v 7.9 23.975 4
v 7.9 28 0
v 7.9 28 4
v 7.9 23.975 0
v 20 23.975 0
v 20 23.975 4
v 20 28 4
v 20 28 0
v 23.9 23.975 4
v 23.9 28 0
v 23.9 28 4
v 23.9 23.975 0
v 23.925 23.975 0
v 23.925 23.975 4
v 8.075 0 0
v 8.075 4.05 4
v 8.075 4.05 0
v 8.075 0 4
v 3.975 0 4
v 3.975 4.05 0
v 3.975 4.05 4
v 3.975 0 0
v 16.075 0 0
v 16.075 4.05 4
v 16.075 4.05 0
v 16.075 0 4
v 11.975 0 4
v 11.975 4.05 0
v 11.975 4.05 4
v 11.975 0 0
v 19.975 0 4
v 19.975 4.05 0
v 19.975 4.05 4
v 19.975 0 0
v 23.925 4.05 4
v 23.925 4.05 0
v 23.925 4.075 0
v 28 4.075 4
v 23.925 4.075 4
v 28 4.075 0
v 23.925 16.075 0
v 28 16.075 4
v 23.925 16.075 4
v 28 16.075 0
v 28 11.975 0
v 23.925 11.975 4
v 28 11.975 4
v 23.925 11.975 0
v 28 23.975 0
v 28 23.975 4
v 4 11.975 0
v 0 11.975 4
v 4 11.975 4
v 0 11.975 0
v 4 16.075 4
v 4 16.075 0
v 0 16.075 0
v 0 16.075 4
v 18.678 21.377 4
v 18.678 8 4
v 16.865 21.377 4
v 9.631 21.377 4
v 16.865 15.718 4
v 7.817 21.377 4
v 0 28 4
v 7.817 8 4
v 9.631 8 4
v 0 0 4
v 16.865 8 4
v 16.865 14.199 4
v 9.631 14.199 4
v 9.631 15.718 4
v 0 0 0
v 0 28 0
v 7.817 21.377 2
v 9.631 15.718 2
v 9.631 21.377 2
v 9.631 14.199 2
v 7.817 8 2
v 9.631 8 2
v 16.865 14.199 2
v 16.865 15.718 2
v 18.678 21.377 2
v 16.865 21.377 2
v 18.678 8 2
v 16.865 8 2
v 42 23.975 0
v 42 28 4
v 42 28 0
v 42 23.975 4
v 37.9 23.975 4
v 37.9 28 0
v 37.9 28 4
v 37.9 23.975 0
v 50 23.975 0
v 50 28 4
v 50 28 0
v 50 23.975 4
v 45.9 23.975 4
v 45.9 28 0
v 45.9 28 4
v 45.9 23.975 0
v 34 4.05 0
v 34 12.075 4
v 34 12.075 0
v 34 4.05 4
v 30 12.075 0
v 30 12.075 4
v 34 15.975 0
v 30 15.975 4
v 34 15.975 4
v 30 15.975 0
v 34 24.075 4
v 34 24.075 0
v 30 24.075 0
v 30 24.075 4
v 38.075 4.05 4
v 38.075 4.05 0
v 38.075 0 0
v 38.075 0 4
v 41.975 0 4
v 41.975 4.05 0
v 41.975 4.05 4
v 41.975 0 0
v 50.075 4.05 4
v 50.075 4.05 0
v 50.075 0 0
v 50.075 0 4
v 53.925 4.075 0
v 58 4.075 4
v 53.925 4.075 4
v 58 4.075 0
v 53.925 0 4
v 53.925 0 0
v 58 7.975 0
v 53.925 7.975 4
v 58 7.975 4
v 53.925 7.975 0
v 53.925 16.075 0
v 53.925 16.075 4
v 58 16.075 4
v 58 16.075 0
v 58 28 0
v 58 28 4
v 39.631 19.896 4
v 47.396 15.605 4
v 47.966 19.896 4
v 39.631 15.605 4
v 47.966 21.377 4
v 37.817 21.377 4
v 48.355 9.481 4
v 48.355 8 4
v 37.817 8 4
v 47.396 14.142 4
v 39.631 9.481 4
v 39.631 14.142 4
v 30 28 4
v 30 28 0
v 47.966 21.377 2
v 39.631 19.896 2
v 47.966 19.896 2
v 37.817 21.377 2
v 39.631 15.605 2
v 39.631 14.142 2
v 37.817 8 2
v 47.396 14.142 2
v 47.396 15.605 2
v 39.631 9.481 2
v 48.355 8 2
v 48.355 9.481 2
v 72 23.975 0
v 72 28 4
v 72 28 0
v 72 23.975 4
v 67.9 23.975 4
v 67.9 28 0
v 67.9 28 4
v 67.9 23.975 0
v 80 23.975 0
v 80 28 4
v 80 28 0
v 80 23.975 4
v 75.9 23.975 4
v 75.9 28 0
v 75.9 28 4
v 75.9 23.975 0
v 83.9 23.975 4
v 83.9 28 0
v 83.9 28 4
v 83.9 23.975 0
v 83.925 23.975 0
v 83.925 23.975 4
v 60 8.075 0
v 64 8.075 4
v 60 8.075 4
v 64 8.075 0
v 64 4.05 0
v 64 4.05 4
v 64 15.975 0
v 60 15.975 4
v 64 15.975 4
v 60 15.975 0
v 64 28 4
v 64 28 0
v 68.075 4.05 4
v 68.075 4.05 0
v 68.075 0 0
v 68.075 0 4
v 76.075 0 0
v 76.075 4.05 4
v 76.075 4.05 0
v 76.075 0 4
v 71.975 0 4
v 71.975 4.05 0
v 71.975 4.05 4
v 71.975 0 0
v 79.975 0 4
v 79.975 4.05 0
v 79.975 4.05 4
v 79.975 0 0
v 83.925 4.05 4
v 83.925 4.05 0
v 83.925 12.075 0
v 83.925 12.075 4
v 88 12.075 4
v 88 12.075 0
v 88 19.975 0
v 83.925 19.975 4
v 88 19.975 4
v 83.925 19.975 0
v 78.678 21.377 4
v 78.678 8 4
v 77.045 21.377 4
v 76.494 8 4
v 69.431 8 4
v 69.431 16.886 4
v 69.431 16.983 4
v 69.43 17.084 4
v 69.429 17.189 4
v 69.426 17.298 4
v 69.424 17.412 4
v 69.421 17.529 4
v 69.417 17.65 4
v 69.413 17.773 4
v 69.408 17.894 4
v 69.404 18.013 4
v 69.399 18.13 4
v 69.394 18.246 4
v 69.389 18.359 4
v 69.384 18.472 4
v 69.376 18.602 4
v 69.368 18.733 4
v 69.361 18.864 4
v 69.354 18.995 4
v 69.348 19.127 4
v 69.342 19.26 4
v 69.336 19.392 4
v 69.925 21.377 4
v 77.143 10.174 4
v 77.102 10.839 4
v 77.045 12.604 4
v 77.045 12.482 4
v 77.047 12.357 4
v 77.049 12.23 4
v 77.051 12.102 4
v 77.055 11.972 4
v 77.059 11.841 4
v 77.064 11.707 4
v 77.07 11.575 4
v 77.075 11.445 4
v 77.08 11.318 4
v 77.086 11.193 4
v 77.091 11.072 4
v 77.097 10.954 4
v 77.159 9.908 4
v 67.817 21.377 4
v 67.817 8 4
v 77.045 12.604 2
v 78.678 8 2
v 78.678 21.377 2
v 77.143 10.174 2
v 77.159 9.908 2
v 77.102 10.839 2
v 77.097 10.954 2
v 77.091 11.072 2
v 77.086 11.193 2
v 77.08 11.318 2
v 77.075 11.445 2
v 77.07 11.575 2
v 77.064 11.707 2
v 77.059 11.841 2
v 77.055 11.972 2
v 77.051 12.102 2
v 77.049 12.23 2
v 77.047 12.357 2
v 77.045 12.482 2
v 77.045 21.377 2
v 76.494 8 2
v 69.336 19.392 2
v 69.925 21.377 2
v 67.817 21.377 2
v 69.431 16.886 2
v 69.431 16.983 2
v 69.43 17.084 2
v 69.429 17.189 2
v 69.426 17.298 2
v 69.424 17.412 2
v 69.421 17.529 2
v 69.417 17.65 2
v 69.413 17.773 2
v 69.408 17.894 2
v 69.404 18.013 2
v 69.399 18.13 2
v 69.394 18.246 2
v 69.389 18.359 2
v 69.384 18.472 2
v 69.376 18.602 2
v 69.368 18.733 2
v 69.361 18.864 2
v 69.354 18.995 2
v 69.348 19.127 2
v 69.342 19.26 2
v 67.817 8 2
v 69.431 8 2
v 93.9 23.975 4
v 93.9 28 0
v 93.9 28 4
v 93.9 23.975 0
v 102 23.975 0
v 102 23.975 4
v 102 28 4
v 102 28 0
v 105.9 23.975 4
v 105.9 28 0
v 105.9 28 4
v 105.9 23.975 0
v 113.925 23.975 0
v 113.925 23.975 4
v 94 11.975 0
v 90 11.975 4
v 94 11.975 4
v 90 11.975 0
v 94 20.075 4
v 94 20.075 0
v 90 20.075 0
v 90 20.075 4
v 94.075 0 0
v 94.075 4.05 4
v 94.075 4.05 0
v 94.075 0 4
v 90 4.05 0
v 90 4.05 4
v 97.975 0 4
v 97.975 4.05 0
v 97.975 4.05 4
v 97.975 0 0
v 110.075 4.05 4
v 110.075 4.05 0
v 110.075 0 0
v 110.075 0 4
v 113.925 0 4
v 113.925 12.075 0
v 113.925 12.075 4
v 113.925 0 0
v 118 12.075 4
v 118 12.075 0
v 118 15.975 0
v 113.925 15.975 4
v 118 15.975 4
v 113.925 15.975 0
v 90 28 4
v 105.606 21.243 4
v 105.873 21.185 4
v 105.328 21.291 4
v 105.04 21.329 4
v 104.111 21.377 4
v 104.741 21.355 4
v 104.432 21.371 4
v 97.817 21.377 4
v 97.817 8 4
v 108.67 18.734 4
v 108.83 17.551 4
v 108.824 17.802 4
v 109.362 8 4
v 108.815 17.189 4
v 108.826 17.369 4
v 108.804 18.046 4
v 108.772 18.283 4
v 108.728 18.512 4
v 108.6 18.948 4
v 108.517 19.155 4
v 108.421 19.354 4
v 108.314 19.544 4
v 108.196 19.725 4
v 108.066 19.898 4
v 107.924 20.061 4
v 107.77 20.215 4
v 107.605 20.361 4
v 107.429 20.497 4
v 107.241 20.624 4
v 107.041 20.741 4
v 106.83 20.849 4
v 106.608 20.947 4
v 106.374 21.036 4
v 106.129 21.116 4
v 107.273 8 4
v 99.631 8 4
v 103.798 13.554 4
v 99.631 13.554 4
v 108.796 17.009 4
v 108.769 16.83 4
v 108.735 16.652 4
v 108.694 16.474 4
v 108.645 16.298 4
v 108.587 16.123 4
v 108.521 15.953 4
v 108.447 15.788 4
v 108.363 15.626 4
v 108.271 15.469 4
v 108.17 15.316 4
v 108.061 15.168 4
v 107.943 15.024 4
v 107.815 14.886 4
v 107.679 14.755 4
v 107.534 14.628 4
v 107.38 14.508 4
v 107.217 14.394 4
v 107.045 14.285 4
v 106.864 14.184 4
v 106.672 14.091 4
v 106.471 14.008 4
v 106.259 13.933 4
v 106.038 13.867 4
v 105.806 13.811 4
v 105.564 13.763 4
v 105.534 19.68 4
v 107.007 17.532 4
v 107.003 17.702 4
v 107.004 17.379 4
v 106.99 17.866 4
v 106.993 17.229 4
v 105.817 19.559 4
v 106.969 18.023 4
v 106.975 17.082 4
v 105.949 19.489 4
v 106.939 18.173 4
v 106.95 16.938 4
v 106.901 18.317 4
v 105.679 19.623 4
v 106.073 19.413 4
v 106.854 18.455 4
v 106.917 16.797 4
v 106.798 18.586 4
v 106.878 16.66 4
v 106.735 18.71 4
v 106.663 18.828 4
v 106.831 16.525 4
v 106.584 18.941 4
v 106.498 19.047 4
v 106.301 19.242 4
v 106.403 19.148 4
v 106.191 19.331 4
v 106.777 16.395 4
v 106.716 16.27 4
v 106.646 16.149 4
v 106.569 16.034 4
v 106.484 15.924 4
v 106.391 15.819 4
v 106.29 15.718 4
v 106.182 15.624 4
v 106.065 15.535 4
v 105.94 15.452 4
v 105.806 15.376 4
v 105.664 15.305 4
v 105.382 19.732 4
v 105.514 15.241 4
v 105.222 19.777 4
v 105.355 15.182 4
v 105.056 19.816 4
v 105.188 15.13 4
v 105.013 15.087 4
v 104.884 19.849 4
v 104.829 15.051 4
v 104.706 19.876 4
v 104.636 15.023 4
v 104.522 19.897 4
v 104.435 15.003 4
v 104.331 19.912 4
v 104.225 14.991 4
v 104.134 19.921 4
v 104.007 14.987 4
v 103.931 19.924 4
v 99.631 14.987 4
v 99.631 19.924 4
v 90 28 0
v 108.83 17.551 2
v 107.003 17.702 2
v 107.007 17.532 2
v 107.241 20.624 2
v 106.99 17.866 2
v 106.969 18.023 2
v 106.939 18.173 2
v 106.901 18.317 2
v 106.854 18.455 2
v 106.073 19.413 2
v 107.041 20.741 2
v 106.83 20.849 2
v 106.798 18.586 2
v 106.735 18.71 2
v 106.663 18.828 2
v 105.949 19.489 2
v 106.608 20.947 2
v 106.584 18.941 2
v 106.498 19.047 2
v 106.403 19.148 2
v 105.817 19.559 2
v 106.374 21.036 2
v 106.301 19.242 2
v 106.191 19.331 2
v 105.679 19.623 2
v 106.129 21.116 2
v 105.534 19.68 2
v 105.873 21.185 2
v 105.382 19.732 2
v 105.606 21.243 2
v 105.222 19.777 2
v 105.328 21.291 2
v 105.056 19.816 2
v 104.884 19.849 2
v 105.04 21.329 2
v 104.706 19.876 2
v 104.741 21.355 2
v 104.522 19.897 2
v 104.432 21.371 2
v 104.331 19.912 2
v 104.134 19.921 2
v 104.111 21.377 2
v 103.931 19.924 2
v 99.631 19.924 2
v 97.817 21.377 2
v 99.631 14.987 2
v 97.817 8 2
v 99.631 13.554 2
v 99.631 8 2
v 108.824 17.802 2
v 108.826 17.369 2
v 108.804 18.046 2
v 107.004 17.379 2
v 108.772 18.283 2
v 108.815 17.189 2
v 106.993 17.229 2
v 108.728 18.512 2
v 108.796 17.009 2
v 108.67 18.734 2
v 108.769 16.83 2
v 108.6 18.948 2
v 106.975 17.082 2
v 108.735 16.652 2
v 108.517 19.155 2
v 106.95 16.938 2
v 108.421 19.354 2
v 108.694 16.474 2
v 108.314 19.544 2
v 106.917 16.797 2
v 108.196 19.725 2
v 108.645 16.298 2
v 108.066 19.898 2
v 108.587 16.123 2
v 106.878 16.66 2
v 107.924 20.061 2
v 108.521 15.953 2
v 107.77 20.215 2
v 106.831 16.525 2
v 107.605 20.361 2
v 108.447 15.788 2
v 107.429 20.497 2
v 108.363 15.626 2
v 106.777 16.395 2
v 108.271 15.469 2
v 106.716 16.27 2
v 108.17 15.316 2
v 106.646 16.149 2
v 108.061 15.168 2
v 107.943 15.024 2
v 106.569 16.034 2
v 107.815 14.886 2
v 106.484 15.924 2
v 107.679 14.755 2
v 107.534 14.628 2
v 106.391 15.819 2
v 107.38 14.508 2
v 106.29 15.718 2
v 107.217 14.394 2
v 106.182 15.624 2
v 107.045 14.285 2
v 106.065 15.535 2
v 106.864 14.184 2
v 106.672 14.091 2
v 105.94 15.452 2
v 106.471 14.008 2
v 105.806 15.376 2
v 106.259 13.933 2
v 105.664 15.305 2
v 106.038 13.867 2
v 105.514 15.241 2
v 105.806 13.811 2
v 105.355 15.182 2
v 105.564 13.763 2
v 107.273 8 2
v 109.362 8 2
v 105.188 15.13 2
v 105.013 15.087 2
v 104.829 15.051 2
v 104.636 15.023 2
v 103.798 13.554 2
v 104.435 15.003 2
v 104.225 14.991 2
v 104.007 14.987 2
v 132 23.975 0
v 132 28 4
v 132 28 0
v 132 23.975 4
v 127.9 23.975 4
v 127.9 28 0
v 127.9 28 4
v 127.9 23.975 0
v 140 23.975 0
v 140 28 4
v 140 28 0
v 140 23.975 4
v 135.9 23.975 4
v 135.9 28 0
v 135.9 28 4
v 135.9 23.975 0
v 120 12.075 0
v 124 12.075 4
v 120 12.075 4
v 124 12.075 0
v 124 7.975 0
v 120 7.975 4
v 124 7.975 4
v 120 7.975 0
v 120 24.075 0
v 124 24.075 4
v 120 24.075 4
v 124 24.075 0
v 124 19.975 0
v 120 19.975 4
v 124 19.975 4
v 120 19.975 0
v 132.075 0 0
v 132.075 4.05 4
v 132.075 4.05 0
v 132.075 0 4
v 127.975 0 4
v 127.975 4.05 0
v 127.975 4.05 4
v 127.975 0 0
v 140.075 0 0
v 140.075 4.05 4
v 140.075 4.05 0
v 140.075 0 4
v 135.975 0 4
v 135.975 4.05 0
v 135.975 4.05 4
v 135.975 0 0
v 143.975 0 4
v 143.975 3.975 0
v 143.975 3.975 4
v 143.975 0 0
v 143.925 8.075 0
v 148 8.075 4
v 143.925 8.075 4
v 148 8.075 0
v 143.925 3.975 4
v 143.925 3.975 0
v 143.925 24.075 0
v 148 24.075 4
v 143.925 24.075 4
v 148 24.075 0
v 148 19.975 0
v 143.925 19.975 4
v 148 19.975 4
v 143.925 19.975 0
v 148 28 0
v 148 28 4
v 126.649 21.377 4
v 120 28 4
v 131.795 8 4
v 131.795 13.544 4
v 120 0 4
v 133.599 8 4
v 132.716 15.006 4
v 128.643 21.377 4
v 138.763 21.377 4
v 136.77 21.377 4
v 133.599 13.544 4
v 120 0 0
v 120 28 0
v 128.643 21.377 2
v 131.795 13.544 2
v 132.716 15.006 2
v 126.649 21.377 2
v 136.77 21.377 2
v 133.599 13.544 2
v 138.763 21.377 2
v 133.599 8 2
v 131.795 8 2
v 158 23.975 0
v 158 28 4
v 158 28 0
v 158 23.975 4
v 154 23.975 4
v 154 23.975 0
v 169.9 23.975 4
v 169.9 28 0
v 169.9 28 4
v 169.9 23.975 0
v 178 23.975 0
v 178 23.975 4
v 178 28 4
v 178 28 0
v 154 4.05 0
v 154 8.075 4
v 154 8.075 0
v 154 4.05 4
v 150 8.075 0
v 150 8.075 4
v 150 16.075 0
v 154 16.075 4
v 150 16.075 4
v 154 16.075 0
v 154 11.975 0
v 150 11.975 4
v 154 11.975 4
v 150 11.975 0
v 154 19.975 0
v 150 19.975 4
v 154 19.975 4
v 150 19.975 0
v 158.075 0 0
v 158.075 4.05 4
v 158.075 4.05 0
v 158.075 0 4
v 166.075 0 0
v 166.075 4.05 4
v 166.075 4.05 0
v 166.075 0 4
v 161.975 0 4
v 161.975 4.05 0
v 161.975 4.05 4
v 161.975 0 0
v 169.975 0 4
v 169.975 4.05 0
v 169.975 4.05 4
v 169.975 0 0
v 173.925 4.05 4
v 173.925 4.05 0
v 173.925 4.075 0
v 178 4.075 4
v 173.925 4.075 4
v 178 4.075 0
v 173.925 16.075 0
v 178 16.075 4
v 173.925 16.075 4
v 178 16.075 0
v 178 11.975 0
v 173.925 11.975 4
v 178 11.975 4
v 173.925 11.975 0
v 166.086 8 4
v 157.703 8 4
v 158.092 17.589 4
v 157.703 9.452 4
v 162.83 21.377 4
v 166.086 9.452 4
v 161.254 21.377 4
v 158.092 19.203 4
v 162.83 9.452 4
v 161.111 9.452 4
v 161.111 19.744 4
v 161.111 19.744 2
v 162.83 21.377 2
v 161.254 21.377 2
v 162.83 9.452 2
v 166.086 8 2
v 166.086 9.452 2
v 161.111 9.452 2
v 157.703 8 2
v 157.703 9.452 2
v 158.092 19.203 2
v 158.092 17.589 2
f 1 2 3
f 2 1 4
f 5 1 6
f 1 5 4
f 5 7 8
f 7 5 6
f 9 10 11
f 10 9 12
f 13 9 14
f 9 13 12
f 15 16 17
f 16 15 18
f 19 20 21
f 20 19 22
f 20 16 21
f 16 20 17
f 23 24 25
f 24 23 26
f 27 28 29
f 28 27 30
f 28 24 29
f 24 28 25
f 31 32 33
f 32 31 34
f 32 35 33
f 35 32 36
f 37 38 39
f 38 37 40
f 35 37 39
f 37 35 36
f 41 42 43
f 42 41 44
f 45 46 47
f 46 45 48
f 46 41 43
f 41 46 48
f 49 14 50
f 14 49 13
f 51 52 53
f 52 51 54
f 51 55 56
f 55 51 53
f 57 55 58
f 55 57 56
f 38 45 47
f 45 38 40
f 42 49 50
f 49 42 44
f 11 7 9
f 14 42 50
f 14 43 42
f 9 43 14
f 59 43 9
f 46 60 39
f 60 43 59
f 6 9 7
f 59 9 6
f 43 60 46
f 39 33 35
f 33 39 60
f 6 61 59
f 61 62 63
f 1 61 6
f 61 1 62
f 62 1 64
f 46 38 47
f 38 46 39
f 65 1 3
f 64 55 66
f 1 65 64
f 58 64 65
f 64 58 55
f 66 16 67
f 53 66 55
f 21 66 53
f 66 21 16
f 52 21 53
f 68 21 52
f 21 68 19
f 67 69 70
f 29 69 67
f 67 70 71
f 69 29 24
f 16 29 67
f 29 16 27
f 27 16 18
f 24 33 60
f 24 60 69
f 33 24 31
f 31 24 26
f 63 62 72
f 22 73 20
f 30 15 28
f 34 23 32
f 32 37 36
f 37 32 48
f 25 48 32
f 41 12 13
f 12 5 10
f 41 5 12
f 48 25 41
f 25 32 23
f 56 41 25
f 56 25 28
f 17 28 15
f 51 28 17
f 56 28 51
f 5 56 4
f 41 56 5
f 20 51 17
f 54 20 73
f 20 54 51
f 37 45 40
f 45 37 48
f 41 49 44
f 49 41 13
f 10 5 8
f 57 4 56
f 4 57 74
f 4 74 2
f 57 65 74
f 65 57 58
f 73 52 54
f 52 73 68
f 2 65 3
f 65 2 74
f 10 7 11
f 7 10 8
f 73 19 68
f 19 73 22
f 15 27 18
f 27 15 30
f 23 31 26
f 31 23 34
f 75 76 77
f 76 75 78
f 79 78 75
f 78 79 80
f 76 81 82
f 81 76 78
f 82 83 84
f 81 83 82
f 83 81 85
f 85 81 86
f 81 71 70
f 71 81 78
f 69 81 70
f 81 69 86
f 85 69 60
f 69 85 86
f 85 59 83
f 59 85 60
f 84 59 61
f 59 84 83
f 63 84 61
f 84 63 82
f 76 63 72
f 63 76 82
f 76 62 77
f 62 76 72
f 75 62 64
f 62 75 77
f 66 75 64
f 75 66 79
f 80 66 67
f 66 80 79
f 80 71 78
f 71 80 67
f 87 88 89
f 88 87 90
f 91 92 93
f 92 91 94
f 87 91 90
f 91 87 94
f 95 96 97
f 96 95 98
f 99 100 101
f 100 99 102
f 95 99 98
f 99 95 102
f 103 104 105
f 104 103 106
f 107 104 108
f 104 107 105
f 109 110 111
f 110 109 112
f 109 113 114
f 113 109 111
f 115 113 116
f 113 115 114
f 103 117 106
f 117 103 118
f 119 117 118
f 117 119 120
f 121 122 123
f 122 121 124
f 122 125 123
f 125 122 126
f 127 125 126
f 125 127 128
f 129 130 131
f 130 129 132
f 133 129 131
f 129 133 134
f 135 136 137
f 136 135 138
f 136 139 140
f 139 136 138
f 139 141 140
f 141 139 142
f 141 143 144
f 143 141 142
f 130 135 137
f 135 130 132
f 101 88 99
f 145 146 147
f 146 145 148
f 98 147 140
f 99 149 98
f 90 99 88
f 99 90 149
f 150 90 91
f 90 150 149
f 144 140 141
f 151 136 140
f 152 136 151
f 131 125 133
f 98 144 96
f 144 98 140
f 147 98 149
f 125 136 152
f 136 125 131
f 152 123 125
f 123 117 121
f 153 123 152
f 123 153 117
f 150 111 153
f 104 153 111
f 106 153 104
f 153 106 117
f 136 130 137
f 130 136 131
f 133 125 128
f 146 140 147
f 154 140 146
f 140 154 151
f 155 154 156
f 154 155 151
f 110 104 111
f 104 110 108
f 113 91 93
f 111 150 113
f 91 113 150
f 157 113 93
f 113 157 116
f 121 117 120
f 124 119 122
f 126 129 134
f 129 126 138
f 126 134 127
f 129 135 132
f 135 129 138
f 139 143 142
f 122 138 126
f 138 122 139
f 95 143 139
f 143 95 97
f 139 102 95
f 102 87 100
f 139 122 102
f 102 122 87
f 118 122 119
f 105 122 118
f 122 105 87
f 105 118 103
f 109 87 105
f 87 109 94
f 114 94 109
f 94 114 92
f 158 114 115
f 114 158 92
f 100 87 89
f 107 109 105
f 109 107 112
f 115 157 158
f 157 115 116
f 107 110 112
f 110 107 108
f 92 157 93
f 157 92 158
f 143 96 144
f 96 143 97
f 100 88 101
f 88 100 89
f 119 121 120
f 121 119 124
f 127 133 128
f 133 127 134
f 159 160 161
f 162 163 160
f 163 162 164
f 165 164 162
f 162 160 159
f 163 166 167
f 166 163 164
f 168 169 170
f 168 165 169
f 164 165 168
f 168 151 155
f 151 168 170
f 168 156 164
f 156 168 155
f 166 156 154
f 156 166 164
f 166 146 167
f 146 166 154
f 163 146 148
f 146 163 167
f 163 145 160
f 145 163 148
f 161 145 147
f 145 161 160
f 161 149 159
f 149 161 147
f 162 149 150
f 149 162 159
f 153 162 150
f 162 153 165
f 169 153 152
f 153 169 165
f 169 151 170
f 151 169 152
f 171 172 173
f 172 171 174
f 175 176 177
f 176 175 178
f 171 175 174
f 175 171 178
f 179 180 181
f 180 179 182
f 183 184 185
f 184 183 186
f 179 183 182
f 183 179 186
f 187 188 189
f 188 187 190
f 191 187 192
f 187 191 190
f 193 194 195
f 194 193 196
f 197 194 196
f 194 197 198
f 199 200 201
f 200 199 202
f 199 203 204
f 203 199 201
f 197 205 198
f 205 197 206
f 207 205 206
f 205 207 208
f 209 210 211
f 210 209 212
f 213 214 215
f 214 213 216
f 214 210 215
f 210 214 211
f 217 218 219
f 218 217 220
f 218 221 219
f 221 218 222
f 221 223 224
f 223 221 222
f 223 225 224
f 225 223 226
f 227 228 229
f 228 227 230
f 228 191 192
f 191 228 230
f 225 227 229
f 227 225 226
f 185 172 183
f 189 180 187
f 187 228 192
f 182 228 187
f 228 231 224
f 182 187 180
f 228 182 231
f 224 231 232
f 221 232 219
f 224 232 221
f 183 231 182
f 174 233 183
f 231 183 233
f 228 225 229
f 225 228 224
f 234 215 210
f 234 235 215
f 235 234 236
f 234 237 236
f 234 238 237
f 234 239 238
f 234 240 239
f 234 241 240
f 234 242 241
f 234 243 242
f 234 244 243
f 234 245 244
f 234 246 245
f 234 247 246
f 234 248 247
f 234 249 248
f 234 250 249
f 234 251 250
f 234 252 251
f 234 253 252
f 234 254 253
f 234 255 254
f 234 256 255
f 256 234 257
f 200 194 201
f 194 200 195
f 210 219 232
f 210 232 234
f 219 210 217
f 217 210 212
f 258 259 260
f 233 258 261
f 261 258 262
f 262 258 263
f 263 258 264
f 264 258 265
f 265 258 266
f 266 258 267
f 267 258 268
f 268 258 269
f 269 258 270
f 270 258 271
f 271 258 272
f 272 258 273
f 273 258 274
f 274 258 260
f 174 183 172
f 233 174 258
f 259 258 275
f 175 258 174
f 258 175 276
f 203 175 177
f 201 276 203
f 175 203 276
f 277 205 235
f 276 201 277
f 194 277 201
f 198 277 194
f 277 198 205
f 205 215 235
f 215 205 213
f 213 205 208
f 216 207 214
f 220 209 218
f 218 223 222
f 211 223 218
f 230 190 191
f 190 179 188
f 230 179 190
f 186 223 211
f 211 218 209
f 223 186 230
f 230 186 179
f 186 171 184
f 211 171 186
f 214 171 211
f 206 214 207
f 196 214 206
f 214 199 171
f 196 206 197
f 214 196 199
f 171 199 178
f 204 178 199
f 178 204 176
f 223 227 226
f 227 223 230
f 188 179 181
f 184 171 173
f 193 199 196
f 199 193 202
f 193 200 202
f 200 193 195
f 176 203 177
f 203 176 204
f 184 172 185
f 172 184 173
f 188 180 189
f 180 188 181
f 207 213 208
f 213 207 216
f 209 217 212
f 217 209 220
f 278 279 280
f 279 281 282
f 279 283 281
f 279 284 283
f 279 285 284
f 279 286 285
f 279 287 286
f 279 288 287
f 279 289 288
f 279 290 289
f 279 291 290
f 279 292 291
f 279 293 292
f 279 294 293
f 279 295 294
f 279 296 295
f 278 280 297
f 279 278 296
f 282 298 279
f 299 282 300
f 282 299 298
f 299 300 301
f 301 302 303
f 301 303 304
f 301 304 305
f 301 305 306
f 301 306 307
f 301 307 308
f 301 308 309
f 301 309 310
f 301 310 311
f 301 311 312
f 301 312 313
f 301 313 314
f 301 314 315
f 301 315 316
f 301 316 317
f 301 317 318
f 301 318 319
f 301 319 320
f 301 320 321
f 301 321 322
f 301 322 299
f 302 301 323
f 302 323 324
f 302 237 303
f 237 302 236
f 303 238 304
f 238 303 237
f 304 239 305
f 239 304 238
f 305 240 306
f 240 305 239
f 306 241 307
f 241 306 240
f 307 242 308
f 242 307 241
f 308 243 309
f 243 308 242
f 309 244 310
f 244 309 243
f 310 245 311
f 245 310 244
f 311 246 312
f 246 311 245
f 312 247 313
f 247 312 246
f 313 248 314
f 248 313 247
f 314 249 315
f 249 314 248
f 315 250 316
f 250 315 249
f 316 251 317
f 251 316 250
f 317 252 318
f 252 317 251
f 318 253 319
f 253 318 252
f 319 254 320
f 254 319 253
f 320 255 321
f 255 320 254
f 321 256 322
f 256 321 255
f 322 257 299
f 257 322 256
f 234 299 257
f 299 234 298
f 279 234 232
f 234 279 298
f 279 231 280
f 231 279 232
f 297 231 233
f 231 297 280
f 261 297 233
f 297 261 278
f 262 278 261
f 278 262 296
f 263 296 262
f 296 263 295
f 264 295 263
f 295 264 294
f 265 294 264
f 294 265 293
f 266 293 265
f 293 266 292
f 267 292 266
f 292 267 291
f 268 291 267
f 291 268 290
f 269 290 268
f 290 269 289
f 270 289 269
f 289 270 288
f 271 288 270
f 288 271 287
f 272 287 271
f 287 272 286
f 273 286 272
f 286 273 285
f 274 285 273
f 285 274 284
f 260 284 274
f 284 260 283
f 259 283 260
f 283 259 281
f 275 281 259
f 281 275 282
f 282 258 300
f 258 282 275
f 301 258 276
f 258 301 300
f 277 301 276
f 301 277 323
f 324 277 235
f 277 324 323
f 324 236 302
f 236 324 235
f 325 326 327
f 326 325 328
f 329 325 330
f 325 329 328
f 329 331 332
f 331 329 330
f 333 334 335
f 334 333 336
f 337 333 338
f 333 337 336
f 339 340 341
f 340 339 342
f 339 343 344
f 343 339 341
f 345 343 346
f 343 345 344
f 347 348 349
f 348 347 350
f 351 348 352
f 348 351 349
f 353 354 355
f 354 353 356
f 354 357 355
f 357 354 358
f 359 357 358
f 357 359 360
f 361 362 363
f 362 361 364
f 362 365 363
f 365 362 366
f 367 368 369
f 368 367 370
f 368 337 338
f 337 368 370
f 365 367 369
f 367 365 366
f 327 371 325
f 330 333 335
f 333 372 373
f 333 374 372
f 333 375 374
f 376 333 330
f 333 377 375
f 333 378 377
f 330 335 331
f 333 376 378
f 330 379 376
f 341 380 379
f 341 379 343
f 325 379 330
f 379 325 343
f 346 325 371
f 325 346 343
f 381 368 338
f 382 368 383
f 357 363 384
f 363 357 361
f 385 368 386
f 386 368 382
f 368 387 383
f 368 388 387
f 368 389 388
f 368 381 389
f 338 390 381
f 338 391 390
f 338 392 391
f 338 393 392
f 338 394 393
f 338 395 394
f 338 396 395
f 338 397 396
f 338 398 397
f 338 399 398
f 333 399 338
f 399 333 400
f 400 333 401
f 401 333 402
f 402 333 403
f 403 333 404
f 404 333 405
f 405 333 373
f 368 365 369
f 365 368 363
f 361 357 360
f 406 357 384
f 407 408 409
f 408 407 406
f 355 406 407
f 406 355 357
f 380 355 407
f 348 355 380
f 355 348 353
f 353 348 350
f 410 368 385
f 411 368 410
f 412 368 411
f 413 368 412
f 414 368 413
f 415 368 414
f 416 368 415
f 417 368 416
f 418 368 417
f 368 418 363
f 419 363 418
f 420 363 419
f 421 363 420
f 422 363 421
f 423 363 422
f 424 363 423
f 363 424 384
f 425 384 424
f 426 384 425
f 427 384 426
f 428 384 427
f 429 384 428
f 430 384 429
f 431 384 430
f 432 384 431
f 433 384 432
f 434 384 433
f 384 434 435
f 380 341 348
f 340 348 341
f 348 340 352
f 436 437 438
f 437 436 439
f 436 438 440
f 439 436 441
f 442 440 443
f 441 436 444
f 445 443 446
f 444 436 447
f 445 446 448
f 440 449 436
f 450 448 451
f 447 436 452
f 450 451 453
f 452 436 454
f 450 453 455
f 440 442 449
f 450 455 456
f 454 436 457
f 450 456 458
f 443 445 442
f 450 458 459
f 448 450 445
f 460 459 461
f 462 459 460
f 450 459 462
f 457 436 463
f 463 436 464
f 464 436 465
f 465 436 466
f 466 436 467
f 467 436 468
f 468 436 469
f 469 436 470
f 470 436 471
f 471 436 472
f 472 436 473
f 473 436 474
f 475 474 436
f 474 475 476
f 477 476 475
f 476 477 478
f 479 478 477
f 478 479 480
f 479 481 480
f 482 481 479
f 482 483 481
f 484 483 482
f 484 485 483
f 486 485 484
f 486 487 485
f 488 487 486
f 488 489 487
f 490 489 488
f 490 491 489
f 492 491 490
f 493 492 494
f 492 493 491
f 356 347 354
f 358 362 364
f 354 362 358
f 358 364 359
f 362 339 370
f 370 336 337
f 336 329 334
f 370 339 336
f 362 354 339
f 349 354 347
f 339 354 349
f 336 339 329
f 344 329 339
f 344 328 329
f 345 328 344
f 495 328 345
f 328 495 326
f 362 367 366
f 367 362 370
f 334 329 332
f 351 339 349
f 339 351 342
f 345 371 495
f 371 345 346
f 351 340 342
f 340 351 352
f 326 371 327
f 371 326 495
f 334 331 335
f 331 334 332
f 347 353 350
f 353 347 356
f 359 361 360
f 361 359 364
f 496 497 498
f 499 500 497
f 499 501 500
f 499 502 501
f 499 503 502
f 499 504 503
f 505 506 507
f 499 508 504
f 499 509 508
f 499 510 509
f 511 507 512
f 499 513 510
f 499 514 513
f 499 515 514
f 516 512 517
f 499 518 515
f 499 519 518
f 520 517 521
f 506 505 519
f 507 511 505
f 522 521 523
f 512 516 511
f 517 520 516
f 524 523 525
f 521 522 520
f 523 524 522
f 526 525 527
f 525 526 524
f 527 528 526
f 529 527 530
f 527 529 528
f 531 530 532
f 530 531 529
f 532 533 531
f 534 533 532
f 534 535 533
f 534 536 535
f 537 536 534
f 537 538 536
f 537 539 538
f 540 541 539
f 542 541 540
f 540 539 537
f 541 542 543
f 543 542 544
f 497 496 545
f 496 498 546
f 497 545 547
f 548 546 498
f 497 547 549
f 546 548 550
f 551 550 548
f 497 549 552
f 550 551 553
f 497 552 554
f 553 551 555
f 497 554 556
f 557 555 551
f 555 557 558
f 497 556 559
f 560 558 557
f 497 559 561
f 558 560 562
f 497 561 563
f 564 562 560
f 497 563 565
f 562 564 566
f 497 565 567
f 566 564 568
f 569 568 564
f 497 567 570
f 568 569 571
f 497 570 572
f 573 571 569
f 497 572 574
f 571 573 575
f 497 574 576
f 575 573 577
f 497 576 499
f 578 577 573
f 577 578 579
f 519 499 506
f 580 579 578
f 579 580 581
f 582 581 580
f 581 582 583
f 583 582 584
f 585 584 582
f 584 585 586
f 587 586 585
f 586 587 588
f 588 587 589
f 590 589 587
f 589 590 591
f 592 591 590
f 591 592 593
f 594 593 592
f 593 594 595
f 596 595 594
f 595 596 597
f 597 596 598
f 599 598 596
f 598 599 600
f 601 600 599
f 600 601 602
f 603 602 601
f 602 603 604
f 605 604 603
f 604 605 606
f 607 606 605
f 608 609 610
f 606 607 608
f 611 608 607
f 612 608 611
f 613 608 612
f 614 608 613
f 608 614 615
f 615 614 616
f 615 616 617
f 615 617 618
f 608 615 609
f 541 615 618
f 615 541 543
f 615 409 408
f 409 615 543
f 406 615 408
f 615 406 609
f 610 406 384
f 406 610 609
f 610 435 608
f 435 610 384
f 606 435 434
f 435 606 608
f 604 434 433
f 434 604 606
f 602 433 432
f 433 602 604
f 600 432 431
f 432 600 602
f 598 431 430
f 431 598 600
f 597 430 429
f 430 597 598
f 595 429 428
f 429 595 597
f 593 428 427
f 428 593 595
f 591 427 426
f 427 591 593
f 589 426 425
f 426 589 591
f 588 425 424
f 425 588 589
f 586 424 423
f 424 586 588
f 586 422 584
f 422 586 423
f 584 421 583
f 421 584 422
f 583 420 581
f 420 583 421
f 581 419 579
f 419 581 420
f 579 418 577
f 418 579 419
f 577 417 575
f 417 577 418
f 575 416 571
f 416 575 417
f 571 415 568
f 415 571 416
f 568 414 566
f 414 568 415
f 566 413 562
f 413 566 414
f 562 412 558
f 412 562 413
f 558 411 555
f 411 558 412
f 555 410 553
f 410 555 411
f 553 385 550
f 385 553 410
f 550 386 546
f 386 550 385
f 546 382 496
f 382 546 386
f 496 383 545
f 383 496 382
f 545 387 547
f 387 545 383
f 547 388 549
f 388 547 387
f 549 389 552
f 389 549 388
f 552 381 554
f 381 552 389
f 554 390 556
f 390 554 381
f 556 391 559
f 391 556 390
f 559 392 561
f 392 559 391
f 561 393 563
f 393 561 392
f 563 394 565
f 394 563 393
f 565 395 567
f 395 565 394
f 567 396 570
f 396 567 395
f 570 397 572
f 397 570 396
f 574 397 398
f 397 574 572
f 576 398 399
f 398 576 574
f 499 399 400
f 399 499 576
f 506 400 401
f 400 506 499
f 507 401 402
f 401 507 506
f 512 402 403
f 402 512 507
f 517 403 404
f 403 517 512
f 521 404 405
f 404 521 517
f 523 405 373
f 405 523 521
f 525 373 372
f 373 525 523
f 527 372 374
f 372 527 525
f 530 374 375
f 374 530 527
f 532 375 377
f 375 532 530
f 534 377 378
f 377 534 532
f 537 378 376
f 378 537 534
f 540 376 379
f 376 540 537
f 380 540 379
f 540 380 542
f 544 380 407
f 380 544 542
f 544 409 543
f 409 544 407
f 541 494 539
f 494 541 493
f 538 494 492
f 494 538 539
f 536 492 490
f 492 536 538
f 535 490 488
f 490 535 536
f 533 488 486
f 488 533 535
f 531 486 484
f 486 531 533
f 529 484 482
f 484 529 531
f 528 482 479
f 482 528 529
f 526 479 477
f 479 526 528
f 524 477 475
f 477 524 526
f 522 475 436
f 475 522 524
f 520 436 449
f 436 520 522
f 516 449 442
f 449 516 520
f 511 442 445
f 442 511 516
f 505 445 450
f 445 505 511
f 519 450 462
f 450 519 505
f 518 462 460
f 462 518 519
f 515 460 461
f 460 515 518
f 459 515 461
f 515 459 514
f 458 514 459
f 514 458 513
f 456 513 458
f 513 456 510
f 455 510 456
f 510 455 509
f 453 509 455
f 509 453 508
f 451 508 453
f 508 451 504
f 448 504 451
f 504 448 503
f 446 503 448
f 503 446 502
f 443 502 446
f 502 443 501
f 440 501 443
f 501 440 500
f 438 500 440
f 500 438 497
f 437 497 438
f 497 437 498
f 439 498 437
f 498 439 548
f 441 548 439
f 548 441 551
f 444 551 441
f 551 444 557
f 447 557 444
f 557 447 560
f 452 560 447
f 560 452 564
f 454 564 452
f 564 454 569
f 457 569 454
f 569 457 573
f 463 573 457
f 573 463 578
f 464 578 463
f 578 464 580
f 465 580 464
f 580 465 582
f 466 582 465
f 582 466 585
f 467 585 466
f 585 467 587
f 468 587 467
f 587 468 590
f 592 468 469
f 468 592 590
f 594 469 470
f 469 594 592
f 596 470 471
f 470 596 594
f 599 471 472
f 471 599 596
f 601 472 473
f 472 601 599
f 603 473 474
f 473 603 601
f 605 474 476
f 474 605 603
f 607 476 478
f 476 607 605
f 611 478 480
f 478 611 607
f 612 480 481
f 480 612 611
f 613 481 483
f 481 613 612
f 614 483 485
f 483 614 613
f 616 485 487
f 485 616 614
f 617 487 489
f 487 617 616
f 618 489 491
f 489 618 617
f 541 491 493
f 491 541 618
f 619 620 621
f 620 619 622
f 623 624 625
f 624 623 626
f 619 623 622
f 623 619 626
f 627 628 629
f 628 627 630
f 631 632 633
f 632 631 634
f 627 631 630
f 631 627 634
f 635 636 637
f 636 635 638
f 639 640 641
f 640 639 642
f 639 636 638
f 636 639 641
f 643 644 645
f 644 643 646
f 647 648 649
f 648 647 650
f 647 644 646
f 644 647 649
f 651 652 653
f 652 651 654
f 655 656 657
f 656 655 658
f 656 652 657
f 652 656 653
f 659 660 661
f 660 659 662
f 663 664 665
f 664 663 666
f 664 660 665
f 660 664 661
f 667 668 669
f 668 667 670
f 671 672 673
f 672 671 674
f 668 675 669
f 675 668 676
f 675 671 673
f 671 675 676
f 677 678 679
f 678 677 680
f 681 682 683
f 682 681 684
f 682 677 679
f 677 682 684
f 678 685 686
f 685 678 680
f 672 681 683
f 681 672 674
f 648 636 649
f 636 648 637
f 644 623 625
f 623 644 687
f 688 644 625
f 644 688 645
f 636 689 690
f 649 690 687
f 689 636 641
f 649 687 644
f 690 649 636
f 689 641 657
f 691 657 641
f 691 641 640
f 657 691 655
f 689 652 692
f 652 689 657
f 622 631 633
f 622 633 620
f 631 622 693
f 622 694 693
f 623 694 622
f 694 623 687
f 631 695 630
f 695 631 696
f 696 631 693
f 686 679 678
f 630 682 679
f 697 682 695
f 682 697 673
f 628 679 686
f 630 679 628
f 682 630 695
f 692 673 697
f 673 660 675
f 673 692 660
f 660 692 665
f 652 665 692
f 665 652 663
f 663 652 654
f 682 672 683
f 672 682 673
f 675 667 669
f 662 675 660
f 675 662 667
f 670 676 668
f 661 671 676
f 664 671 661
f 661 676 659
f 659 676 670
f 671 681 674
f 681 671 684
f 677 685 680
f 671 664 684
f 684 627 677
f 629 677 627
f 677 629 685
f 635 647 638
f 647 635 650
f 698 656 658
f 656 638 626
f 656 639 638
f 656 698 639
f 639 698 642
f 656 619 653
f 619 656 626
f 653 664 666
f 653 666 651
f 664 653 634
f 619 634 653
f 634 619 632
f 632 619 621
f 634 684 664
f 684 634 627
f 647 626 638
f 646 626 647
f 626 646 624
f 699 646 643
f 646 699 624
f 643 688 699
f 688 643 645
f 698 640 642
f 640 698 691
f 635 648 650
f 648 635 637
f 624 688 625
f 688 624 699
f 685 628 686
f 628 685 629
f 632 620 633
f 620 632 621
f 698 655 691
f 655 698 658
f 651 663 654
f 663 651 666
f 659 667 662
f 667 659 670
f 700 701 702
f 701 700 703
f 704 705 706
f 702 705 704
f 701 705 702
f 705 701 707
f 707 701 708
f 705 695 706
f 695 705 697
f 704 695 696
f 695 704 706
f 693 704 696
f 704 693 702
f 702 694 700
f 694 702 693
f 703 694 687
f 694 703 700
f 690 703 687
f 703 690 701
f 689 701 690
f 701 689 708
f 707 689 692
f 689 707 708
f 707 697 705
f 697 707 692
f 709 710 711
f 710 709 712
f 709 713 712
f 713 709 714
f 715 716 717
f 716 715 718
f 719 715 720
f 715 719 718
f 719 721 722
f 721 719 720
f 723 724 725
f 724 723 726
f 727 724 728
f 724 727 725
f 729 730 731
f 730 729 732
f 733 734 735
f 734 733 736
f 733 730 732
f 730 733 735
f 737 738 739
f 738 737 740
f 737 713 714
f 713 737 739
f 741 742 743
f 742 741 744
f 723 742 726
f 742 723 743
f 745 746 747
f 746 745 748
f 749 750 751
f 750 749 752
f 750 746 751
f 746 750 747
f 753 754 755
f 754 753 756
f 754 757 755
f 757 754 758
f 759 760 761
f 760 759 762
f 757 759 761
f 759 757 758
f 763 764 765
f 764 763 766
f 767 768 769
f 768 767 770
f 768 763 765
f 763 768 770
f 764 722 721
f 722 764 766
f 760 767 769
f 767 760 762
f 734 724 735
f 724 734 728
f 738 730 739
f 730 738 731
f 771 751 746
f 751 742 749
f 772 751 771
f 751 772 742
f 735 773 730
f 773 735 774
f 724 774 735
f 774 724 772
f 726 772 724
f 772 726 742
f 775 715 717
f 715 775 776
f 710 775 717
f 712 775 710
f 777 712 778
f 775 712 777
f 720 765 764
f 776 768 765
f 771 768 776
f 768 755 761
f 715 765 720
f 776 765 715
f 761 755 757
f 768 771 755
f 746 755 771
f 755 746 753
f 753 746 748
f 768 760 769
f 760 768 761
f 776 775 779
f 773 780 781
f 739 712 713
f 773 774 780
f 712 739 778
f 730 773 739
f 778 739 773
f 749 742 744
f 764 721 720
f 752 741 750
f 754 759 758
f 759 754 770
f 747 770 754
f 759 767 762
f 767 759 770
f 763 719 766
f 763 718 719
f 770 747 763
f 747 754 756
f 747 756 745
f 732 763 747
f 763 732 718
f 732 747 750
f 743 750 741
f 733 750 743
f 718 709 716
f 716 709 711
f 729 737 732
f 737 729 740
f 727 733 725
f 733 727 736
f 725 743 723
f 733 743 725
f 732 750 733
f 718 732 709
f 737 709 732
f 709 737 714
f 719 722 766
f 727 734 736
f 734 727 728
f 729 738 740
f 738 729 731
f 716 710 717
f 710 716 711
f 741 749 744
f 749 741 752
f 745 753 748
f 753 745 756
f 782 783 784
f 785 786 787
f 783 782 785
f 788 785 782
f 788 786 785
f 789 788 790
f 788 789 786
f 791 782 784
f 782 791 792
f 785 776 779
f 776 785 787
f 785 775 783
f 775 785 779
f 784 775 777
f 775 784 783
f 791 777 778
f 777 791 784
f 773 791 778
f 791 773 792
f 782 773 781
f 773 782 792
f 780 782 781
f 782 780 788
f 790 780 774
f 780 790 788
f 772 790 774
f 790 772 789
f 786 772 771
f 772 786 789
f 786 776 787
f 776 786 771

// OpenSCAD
// file: jg_box_puzzle_module_v1.scad
// Puzzle variables
//thickness = 5;
//num_notches_per_edge = 7;
//seed=3.1459;    // This determines the notch pattern for all edges

// ------------------------
// Box Puzzle Module Constants
// ------------------------
// Pieces
P1 = 0;
P2 = 1;
P3 = 2;
P4 = 3;
P5 = 4;
P6 = 5;

// Edges
TOP = 0;
LFT = 1;
BOT = 2;
RHT = 3;

// Notch directions
DIR_POS = "P";
DIR_NEG = "N";

// Notch order
ORD_STD = "S";
ORD_REV = "R";

// Box specific values
NUM_PIECES = 6;
NUM_EDGES  = 4;
NUM_JOINING_EDGES  = 12;


// ------------------------
// Box Puzzle Global Functions
// ------------------------

// Box puzzle defn:
//                     P6
// piece layout: P1 P2 P3 P4
//                     P5
//
// each puzzle has 6 pieces (0-5): Level 1
// each piece has 4 edges (0=TOP, 1=left, 2=BOT, 3=right): Level 2
// each edge has 7 possible notches: Level 3
// there are 12 joining edges that relate 
//  a specific edge of one piece to a specific 
//  edge of another piece. A postive edge on the 
//  first piece will mate with the negative edge
//  on the second piece.
//  Level 1: joining edge number (0-11)
//  Level 2: relates piece1/edge to piece2/edge
//  [[piece#,edge#], [piece#,edge#]]
function getJoiningEdgeList() = [
    [[P1,TOP], [P6,TOP]], //P1,TOP to P6,TOP      1 [0] Reverse
    [[P2,TOP], [P6,LFT]], //P2,TOP to P6,Left     2 [1]
    [[P3,TOP], [P6,BOT]], //P3,TOP to P6,BOT      3 [2]
    [[P4,TOP], [P6,RHT]], //P4,TOP to P6,Right    4 [3]
    
    [[P1,LFT], [P4,RHT]], //P1,Left to P4,Right   5 [4] Reverse
    
    [[P1,BOT], [P5,BOT]], //P1,BOT to P5,BOT      6 [5] Reverse
    [[P2,BOT], [P5,LFT]], //P2,BOT to P5,Left     7 [6]
    [[P3,BOT], [P5,TOP]], //P3,BOT to P5,TOP      8 [7]
    [[P4,BOT], [P5,RHT]], //P4,BOT to P5,Right    9 [8]
    
    [[P1,RHT], [P2,LFT]], //P1,Right to P2,Left   10 [9]
    [[P2,RHT], [P3,LFT]], //P2,Right to P3,Left   11 [10]
    [[P3,RHT], [P4,LFT]], //P3,Right to P4,Left   12 [11]
];

// Indices match with getJoiningEdgeList
function getJoiningEdgeNotchList_old(seed, edge_notches) = [ 
    for (s = rands(0, 100, NUM_JOINING_EDGES, seed)) 
        [ for (n = rands(0,1,edge_notches,s)) round(n) ] 
];

// Indices match with getJoiningEdgeList
function getJoiningEdgeNotchList(seed, edge_notches) = [
        [0,0,1,1,1,0,1], //1
        [0,0,1,0,1,0,0], //2
        [1,0,1,0,1,0,1], //3
        [0,1,1,0,1,1,1], //4
        [0,0,0,1,0,0,0], //5
        [0,1,0,1,0,1,1], //6
        [1,1,0,1,1,0,1], //7
        [1,1,0,1,0,1,1], //8
        [1,0,1,1,1,0,1], //9
        [1,0,0,1,0,0,1], //10
        [1,0,1,1,0,0,0], //11
        [1,1,1,0,0,1,1], //12
];


// Relates each edge of each puzzle piece to 
// a top level element of the joining_edge_list
// with appropriate notch direction and ordering.
function getPieceEdgeToJoiningEdgeList() = [
    [ [TOP, 0,DIR_POS,ORD_STD], [LFT, 4,DIR_POS,ORD_STD], [BOT, 5,DIR_POS,ORD_STD], [RHT, 9,DIR_POS,ORD_STD] ], //P1 
    [ [TOP, 1,DIR_POS,ORD_STD], [LFT, 9,DIR_NEG,ORD_STD], [BOT, 6,DIR_POS,ORD_STD], [RHT,10,DIR_POS,ORD_STD] ], //P2 
    [ [TOP, 2,DIR_POS,ORD_STD], [LFT,10,DIR_NEG,ORD_STD], [BOT, 7,DIR_POS,ORD_STD], [RHT,11,DIR_POS,ORD_STD] ], //P3 
    [ [TOP, 3,DIR_POS,ORD_STD], [LFT,11,DIR_NEG,ORD_STD], [BOT, 8,DIR_POS,ORD_STD], [RHT, 4,DIR_NEG,ORD_REV] ], //P4 
    [ [TOP, 7,DIR_NEG,ORD_STD], [LFT, 6,DIR_NEG,ORD_STD], [BOT, 5,DIR_NEG,ORD_REV], [RHT, 8,DIR_NEG,ORD_STD] ], //P5 
    [ [TOP, 0,DIR_NEG,ORD_REV], [LFT, 1,DIR_NEG,ORD_STD], [BOT, 2,DIR_NEG,ORD_STD], [RHT, 3,DIR_NEG,ORD_STD] ], //P6 
];

// Returns a new list with the order reversed from the given list.
function getReversedOrderList(list) = [
    for (i=[len(list)-1:-1:0]) list[i]
];

// Returns a new list with 0's changed to 1's and 1's changed to 0's.
function getSwitchedDirectionList(list) = [
    for (i=[0:len(list)-1]) list[i] == 1 ? 0 : 1
];

// Returns a list of notches with the appropriate direction and order.
function getNotchList(list, direction, order) =
    direction==DIR_NEG && order==ORD_REV ?
        getSwitchedDirectionList(getReversedOrderList(list)) :
        direction==DIR_NEG && order==ORD_STD ?
            getSwitchedDirectionList(list) :
            direction==DIR_POS && order==ORD_REV ?
                getReversedOrderList(list) :
                list;
;

// Returns a list of 6 pieces, each piece has 4 edges 
// and each edge has a notch list length of edge_notches.
function getPieceEdgeNotchList(seed, edge_notches) =
    let (je_notch_list = getJoiningEdgeNotchList(seed, edge_notches))
    let (pe_to_je_list = getPieceEdgeToJoiningEdgeList())
    [
    for (p=[0:NUM_PIECES-1]) 
        [
        for (e=[0:NUM_EDGES-1])
            getNotchList( 
                je_notch_list[pe_to_je_list[p][e][1]],  // Notch List
                pe_to_je_list[p][e][2],                 // Direction
                pe_to_je_list[p][e][3]                  // Order
            )
        ] 
    ]
;

module box_piece(piece_num, thickness, edge_notch_list, boxLetters) {
    slop = .05;
    num_notches = len(edge_notch_list[0]);
    side_len = thickness*num_notches;
    font_size = side_len/2;

    //TOP Edge: translate([-slop/2, side_len-thickness, -slop/2]) rotate([0,0,0])
    //Left Edge: translate([thickness-slop/2, -slop/2, -slop/2]) rotate([0,0,90])
    //Bottom Edge: translate([-slop/2, -slop/2, -slop/2]) rotate([0,0,0])
    //Right Edge: translate([side_len, -slop/2, -slop/2]) rotate([0,0,90])
    //Translations List
    t = [
        [-slop*2,           side_len-thickness, -slop/2], //Top
        [thickness-slop/2,  -slop/2,            -slop/2],   //Left
        [-slop/2,           -slop/2,            -slop/2],            //Bot
        [side_len,          -slop/2,            -slop/2]            //Right
    ];
    //Rotations List
    r = [
        [0,0,0],    //Top
        [0,0,90],   //Left
        [0,0,0],    //Bot
        [0,0,90]    //Right
    ];
    
    difference() {
        cube([side_len, side_len, thickness]);
        //Remove edge notches
        for (e=[0:NUM_EDGES-1]) {
            //scale([1+slop,1+slop,1+slop]) {
                translate(t[e])
                rotate(r[e])
                notched_edge(e, thickness, edge_notch_list[e], slop);
            //}
        }
        //Remove Letter
        translate([side_len/4.5, side_len/3.5, thickness/2]) 
            linear_extrude(thickness*2) text(boxLetters[piece_num], size=font_size, font="Arial:style=Black");
    }
    
}

module notched_edge(edge_num, thickness, notch_list, slop) {
    union() {
        for (i=[0:len(notch_list)-1]) {
            translate([i*(thickness), -slop/2, -slop/2])
            cube([notch_list[i]*(thickness+slop*2), thickness+slop*2, thickness+slop*2]);
        }
    }
}

module notched_edge_old2(edge_num, thickness, notch_list, slop) {
    union() {
        for (i=[0:len(notch_list)-1]) {
            translate([i*thickness-(slop), -slop/2, -slop/2])
            #cube([notch_list[i]*(thickness+slop), thickness+slop, thickness+slop]);
        }
    }
}

module notched_edge_old(edge_num, thickness, notch_list) {
    slop = .015;
    scale([1+slop,1+slop,1+slop]) {
        union() {
            for (i=[0:len(notch_list)-1]) {
                translate([i*thickness, -slop, -thickness/2])
                #cube([notch_list[i]*thickness, thickness, thickness*2]);
            }
        }
    }
}
// main file
use <jg_box_puzzle_module_v1.scad>;

$fa = 1;
$fs = 0.4;
$fn=50;

// Puzzle variables
thickness = 4;
num_notches_per_edge = 7;
seed=3.1459; // This determines the notch pattern for all edges (not working)
boxLetters = "HENRY1";
spacing = thickness*num_notches_per_edge+2;

edge_notch_list = getPieceEdgeNotchList(seed, num_notches_per_edge);
echo(len(edge_notch_list));
echo(len(edge_notch_list[0]));
echo(edge_notch_list);

//for (p=[0:len(edge_notch_list)-1]) {
//    echo("piece: ",p);
//    translate([((p-(p%2))*spacing)/2, -(p%2)*spacing, 0])
//    box_piece(p, thickness, edge_notch_list[p], boxLetters);
//}

for (p=[0:len(edge_notch_list)-1]) {
    echo("piece: ",p);
    translate([p*spacing, 0, 0])
    box_piece(p, thickness, edge_notch_list[p], boxLetters);
}
